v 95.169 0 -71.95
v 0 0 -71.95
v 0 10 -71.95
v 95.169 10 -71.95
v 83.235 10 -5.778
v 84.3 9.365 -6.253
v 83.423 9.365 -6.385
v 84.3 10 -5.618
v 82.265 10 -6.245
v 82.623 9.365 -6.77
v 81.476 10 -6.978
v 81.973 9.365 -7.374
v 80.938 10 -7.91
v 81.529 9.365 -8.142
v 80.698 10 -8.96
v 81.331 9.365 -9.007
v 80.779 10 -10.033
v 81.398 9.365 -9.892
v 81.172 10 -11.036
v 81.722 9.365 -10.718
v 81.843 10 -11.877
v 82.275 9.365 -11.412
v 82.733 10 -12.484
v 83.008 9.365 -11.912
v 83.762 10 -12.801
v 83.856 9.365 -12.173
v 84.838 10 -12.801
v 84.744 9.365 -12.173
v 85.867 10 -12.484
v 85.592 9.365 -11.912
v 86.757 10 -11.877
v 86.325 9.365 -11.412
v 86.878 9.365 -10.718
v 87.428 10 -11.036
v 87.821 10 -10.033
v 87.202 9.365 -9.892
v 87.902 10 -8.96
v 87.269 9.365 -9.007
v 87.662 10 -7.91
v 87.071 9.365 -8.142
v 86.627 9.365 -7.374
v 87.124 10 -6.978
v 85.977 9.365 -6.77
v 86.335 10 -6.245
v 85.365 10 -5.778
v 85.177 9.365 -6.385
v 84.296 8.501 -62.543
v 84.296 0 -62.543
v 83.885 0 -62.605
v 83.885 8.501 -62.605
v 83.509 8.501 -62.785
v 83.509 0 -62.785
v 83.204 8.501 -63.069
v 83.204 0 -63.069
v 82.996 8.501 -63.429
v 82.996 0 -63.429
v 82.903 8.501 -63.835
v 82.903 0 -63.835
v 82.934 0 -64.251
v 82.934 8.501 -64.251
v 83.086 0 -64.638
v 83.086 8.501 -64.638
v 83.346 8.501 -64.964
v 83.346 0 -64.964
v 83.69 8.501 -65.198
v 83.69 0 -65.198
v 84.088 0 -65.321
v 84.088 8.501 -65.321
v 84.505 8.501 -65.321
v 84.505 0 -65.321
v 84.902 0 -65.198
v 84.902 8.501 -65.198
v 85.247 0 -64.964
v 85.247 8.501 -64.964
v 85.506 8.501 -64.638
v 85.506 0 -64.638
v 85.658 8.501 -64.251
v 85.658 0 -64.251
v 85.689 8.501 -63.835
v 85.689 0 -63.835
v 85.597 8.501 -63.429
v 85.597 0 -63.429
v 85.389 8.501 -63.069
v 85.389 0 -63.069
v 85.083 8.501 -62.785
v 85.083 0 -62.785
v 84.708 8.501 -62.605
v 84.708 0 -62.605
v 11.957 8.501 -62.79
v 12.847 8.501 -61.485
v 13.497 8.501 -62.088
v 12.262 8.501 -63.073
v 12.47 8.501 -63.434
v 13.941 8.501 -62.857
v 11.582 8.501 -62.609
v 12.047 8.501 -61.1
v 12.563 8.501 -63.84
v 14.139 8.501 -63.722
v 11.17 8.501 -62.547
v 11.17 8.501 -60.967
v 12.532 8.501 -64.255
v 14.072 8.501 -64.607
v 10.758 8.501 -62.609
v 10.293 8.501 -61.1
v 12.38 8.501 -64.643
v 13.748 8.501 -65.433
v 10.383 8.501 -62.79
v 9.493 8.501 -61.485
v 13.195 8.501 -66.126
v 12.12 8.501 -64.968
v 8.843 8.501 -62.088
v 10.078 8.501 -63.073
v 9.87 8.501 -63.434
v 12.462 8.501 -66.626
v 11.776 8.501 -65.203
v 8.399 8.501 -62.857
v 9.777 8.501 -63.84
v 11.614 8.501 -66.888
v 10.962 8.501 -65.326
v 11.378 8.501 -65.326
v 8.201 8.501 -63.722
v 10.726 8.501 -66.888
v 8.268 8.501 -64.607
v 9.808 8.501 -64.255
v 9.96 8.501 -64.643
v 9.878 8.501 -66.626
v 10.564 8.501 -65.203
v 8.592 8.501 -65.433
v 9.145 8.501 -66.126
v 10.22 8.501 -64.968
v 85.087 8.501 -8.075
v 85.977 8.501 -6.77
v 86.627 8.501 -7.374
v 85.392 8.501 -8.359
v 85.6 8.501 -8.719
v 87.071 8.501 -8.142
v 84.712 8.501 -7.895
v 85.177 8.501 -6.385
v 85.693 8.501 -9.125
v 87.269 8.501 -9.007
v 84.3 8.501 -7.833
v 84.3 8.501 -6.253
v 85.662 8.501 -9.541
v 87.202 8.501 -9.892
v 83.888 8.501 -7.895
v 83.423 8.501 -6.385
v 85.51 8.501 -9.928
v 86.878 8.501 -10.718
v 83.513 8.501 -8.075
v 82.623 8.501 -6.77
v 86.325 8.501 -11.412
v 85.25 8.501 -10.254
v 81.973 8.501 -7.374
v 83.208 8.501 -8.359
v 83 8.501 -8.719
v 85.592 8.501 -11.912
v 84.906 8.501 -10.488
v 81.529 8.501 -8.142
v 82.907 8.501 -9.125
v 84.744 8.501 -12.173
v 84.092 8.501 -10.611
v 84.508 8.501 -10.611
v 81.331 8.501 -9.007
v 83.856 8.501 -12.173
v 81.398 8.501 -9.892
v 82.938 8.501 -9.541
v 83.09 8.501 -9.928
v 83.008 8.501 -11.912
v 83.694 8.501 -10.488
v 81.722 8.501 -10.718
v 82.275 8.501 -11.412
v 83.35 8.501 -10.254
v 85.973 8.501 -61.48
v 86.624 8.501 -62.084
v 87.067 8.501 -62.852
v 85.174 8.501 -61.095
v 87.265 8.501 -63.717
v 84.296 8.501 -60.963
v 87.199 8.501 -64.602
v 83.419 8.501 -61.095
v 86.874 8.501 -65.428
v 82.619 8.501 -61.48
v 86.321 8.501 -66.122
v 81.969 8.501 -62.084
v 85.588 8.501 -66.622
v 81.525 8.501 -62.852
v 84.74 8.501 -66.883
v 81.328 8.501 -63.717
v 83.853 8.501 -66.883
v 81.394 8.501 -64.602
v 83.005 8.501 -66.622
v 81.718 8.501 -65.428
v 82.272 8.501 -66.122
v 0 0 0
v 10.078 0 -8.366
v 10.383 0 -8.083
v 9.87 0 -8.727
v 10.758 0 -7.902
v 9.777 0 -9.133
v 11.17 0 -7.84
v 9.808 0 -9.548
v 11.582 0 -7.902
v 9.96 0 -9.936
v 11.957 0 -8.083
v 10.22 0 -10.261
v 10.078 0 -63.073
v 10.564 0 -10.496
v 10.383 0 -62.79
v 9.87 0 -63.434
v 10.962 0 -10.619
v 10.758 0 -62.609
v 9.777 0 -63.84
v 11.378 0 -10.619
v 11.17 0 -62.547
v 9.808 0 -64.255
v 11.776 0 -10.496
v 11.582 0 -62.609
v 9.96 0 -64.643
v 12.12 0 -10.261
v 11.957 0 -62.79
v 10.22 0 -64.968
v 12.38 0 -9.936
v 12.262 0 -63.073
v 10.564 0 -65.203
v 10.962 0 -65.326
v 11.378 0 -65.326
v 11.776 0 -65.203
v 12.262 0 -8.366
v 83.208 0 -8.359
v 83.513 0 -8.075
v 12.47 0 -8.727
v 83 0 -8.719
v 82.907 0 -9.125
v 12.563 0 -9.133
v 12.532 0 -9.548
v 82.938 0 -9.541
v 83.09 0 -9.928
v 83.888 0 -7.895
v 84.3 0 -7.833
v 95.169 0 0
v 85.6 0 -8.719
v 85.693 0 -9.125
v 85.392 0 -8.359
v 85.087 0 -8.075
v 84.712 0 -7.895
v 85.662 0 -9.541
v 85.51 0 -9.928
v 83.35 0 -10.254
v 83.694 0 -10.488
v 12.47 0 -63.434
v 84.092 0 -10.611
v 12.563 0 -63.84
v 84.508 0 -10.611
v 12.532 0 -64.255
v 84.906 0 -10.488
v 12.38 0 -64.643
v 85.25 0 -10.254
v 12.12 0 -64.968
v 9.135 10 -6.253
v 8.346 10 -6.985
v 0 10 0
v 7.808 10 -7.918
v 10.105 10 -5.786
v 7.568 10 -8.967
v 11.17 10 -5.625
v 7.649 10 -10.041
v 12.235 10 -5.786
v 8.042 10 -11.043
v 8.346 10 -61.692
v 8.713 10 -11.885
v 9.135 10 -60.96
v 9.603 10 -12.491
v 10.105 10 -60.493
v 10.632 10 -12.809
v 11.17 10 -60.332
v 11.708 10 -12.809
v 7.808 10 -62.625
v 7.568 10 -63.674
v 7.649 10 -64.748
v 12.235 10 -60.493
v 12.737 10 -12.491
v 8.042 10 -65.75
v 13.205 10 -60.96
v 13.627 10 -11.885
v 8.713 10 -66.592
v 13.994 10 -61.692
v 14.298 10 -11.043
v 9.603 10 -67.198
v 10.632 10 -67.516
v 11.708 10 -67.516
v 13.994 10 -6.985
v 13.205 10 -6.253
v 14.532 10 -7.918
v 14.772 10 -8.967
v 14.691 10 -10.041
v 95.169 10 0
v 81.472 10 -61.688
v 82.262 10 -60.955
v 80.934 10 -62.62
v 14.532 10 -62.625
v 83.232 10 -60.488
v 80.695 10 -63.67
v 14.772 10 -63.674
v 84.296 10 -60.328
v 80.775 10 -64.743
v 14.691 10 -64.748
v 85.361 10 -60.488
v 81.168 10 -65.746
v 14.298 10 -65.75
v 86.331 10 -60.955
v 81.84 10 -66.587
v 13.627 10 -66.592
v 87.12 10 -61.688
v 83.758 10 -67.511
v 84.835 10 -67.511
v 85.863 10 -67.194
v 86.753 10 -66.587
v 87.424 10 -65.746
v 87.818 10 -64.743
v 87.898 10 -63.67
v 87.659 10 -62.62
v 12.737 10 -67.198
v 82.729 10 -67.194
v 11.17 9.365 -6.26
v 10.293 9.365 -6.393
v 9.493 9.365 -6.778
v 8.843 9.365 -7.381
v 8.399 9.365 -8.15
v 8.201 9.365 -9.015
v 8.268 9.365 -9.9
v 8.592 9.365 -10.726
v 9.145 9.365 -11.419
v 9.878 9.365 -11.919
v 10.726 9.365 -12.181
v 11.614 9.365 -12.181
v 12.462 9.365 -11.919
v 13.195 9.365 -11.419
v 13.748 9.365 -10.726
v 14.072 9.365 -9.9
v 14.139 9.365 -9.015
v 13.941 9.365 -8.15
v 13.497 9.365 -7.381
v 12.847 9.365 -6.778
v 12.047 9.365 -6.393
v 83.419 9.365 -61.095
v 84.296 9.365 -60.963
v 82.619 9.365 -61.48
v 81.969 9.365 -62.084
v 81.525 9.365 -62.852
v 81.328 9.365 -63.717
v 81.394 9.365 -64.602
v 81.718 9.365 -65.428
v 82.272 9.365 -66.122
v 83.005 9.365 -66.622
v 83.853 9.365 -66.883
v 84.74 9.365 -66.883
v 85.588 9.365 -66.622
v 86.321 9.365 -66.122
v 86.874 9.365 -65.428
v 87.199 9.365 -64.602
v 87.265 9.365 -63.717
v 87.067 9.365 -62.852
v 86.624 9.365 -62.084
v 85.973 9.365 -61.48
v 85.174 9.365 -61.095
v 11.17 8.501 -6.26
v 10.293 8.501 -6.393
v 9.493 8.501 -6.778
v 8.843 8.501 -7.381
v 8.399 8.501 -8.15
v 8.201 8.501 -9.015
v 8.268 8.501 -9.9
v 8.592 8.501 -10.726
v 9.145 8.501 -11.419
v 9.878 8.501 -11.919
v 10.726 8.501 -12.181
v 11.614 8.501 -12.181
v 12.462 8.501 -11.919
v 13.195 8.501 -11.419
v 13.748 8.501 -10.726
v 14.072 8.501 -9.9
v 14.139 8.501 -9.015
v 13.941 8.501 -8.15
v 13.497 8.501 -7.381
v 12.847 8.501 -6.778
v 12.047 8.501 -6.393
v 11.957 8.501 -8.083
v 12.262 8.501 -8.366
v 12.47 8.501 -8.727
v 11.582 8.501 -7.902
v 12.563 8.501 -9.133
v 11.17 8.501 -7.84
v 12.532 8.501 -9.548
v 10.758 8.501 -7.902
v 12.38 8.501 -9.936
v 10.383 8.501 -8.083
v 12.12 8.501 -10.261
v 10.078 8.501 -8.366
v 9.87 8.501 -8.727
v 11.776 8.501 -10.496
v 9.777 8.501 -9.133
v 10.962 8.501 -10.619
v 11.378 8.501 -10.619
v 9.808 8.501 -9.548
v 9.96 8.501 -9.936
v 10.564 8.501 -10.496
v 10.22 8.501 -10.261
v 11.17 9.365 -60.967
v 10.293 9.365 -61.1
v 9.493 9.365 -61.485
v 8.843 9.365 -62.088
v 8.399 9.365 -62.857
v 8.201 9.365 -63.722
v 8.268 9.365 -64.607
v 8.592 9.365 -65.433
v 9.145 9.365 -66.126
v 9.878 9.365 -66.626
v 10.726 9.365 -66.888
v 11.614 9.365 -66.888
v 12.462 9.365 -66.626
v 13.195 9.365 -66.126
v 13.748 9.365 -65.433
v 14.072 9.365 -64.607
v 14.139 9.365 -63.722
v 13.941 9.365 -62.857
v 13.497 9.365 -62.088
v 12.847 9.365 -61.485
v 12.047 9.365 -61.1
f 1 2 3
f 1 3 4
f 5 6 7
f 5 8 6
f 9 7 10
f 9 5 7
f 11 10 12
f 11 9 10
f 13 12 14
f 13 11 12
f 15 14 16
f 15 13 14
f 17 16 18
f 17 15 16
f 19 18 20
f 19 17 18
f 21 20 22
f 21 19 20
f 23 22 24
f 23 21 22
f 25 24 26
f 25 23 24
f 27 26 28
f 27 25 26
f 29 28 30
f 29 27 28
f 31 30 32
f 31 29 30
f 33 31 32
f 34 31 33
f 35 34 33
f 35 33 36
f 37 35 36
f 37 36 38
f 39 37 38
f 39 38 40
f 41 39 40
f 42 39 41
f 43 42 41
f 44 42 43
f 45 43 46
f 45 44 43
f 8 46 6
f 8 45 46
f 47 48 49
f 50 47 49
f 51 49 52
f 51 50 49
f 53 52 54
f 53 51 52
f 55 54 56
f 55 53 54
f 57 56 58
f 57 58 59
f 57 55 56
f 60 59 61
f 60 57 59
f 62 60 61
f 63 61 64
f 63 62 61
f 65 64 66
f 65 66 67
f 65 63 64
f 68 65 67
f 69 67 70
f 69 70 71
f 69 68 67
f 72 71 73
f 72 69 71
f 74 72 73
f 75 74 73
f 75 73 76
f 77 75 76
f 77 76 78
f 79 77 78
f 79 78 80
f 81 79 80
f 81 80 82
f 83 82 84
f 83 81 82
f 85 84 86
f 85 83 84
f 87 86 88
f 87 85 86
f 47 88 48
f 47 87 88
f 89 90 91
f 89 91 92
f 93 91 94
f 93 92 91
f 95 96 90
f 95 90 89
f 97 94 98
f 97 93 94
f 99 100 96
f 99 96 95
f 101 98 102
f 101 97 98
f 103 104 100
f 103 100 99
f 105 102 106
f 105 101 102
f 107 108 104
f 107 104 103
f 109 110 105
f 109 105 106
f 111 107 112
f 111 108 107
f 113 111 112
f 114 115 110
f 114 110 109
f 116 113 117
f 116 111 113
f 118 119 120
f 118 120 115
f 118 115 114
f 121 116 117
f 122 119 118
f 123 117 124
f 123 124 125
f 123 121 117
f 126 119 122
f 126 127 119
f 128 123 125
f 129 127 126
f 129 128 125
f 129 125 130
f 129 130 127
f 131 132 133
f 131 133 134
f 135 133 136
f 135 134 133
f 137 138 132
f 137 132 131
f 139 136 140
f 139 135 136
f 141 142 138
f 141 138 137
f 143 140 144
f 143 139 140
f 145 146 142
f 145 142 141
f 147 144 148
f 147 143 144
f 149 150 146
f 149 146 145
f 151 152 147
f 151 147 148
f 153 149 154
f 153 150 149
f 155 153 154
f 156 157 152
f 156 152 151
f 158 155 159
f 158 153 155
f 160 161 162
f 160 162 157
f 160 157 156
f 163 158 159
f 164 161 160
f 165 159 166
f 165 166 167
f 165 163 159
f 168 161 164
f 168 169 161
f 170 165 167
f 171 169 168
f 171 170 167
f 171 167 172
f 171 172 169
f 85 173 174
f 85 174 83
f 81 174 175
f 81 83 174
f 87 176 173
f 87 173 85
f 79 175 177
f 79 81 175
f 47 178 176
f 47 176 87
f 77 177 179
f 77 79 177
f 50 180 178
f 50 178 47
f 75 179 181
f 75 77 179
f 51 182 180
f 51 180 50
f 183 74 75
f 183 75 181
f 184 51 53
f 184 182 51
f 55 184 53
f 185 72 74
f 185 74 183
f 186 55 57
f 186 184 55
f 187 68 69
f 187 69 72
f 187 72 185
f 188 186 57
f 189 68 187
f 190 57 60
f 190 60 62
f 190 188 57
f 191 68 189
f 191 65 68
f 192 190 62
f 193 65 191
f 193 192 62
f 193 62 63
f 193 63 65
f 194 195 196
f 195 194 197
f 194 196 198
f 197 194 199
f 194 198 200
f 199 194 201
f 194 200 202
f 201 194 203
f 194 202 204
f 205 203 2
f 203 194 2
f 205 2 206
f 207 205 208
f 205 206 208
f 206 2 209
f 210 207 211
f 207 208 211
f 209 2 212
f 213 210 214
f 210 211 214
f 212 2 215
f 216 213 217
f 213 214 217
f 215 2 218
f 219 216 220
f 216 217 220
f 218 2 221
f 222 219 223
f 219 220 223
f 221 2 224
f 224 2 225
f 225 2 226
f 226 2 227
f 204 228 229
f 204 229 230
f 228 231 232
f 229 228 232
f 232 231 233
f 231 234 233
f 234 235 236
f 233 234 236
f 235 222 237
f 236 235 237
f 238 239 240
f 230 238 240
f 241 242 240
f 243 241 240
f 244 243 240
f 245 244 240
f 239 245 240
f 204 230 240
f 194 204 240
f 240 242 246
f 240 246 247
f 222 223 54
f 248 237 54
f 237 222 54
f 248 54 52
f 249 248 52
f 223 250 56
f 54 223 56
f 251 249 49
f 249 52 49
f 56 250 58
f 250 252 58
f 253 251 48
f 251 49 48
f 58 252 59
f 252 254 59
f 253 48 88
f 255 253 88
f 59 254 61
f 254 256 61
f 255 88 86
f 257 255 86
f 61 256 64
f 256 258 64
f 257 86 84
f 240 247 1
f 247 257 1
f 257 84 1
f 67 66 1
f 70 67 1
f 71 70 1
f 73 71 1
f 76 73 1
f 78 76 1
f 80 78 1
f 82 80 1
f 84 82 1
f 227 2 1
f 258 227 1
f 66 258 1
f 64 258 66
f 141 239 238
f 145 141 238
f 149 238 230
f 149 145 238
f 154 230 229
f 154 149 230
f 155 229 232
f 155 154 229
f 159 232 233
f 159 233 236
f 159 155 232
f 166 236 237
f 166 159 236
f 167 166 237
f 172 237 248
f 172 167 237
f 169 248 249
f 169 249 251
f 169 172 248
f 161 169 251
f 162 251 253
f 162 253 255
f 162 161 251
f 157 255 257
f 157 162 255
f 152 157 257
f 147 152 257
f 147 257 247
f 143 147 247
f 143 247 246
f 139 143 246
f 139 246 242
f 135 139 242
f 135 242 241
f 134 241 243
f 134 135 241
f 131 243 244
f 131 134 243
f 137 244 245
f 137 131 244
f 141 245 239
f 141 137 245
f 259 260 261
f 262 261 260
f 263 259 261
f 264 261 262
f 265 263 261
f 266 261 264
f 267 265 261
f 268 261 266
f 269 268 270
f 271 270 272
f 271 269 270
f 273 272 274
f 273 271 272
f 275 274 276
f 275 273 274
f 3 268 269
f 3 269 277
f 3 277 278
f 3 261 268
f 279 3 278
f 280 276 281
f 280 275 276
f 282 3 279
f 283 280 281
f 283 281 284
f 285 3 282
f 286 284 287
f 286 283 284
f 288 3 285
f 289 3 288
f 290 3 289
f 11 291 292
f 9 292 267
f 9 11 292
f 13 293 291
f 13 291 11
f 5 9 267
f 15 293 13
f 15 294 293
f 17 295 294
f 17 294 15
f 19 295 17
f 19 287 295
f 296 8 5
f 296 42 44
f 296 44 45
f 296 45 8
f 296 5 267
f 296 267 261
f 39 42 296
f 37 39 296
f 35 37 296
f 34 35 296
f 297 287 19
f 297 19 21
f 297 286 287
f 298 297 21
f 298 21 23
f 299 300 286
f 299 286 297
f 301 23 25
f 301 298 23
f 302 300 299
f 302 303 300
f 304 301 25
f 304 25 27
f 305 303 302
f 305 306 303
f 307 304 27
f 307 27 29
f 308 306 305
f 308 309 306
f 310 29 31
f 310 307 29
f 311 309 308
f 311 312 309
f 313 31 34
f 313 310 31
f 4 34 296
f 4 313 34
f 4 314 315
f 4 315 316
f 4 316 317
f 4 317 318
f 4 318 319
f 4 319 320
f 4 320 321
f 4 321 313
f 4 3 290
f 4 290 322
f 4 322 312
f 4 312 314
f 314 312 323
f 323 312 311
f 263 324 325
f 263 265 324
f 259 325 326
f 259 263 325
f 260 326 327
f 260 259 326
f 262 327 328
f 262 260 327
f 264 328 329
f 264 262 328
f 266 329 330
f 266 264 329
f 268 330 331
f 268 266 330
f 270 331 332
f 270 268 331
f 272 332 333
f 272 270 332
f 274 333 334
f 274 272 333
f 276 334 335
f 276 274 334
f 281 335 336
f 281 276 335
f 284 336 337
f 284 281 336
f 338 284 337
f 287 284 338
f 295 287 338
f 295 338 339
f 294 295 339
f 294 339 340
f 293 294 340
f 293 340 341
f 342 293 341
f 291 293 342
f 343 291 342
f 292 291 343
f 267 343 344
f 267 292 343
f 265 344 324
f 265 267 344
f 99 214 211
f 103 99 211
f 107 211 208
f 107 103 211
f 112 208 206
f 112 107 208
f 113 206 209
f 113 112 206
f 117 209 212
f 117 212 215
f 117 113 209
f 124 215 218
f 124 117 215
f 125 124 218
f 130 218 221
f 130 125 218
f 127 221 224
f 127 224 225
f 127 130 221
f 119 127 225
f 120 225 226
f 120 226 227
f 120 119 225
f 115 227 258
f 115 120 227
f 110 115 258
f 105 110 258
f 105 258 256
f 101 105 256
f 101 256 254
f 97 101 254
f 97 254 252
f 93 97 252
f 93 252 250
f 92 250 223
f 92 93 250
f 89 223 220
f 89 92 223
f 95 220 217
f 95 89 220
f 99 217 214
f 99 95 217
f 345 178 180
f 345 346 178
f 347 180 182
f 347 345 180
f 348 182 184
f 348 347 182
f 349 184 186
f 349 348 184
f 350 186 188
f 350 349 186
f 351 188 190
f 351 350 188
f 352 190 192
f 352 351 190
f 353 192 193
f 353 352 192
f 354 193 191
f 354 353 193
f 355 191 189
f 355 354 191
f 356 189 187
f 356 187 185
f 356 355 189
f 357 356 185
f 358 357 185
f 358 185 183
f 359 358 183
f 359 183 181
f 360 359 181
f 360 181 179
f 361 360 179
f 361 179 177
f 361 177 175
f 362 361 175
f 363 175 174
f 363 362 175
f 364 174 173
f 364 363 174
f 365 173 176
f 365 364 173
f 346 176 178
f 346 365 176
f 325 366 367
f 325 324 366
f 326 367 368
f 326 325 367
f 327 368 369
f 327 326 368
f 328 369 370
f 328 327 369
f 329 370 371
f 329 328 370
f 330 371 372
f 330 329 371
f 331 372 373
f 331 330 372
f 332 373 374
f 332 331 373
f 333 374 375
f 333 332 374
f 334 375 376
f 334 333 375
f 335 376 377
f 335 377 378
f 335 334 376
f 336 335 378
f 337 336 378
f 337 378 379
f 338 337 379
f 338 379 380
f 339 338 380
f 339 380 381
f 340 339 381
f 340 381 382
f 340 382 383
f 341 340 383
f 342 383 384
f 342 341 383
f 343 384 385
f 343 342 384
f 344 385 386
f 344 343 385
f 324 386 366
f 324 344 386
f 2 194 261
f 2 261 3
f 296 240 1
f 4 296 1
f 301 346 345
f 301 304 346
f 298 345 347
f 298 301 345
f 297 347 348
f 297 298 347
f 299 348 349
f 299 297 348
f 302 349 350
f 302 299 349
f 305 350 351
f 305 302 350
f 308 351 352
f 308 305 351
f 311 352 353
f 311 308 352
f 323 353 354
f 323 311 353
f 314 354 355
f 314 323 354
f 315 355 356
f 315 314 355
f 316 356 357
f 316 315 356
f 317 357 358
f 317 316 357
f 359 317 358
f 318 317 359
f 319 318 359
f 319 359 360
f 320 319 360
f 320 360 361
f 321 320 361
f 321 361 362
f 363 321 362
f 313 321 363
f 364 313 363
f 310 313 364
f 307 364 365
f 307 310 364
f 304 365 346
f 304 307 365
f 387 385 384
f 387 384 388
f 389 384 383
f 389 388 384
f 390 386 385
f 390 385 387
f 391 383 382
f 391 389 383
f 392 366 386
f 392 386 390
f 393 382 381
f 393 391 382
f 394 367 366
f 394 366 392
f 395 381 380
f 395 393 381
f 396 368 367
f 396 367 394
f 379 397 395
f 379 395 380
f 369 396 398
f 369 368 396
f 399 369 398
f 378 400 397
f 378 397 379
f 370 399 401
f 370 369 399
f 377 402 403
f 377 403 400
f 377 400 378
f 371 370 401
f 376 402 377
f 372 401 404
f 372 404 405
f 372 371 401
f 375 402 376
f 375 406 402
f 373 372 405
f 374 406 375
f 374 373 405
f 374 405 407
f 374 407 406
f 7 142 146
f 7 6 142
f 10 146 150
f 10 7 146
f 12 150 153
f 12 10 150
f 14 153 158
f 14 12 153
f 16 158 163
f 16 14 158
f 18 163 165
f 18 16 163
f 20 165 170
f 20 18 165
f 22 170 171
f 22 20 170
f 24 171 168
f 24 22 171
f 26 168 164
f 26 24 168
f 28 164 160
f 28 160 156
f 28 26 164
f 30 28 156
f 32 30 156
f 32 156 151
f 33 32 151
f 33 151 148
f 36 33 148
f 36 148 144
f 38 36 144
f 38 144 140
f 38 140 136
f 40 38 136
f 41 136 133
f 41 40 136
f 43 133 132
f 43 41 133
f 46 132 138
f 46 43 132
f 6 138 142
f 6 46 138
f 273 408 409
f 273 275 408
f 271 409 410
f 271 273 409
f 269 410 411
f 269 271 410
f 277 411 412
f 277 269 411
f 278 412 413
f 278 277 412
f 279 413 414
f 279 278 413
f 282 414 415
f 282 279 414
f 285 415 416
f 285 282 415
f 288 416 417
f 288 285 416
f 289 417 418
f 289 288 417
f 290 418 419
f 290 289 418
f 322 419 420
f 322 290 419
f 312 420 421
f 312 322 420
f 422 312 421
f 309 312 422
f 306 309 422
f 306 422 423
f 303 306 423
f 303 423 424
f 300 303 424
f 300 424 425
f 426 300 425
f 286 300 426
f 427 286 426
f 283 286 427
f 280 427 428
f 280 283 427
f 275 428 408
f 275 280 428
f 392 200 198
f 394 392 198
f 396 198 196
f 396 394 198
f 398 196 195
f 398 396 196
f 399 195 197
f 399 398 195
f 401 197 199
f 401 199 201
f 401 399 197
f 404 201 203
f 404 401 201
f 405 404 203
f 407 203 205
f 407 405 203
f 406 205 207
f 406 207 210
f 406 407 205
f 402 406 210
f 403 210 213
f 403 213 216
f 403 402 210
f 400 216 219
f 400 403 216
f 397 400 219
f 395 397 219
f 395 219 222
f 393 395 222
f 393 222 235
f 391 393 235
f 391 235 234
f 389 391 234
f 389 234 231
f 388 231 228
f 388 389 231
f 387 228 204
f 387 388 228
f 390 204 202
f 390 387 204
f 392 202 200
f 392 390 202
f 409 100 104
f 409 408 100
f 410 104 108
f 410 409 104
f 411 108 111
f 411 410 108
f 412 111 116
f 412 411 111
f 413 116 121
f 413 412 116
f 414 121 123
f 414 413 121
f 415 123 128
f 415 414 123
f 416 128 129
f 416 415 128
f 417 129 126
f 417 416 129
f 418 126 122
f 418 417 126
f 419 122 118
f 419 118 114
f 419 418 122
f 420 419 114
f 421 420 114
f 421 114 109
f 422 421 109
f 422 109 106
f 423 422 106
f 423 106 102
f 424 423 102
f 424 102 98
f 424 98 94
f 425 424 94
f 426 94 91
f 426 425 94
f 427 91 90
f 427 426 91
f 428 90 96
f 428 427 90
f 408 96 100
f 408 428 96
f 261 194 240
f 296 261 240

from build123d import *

# Parameters (mm, degrees)
SKETCH1_W                                   = 95.169284227
SKETCH1_H                                   = 71.949644858
BOSS_EXTRUDE1_DEPTH                         = 10
CBORE_FOR_3_BINDING_HEAD_MACHINE_SC_2_COUNT = 2
CBORE_FOR_3_BINDING_HEAD_MACHINE_SC_2_PITCH = 54.707018707
CBORE_FOR_3_BINDING_HEAD_MACHINE_SC_3_COUNT = 2
CBORE_FOR_3_BINDING_HEAD_MACHINE_SC_3_PITCH = 73.126317411
CBORE_FOR_3_BINDING_HEAD_MACHINE_SC_4_COUNT = 2
CBORE_FOR_3_BINDING_HEAD_MACHINE_SC_4_PITCH = 91.332818695


with BuildPart() as part:
    # Sketch1 → Boss-Extrude1 (new body)
    with BuildSketch(Plane(origin=(0, 0, 0), x_dir=(1, 0, 0), z_dir=(0, 1, 0))):
        with Locations((47.584642114, 35.974822429)):
            Rectangle(SKETCH1_W, SKETCH1_H)
    extrude(amount=BOSS_EXTRUDE1_DEPTH)

    # Sketch3 → CBORE for #3 Binding Head Machine Screw1 (revolve, cut)
    with BuildSketch(Plane(origin=(11.17, 10, -63.944240186), x_dir=(0, 0, 1), z_dir=(1, 0, 0))):
        Polygon((0, 0), (0, 10), (1.397, 10), (1.397, 1.4986), (2.97688, 1.4986), (2.97688, 0.635), (3.61188, 0), align=None)
    cbore_for_3_binding_head_machine_screw1 = revolve(axis=Axis((11.17, 16.35, -63.944240186), (0, -1, 0)), mode=Mode.SUBTRACT)

    # CBORE for _3 Binding Head Machine Sc 2: CBORE for #3 Binding Head Machine Screw1 ×2
    with Locations(*[(0, 0, i * CBORE_FOR_3_BINDING_HEAD_MACHINE_SC_2_PITCH) for i in range(1, CBORE_FOR_3_BINDING_HEAD_MACHINE_SC_2_COUNT)]):
        add(cbore_for_3_binding_head_machine_screw1, mode=Mode.SUBTRACT)

    # CBORE for _3 Binding Head Machine Sc 3: CBORE for #3 Binding Head Machine Screw1 ×2
    with Locations(*[Vector(0.9999999980255075, 0, 6.284095007611635e-05) * (i * CBORE_FOR_3_BINDING_HEAD_MACHINE_SC_3_PITCH) for i in range(1, CBORE_FOR_3_BINDING_HEAD_MACHINE_SC_3_COUNT)]):
        add(cbore_for_3_binding_head_machine_screw1, mode=Mode.SUBTRACT)

    # CBORE for _3 Binding Head Machine Sc 4: CBORE for #3 Binding Head Machine Screw1 ×2
    with Locations(*[Vector(0.8006979380692495, 0, 0.5990682865681111) * (i * CBORE_FOR_3_BINDING_HEAD_MACHINE_SC_4_PITCH) for i in range(1, CBORE_FOR_3_BINDING_HEAD_MACHINE_SC_4_COUNT)]):
        add(cbore_for_3_binding_head_machine_screw1, mode=Mode.SUBTRACT)


solid = part.part
